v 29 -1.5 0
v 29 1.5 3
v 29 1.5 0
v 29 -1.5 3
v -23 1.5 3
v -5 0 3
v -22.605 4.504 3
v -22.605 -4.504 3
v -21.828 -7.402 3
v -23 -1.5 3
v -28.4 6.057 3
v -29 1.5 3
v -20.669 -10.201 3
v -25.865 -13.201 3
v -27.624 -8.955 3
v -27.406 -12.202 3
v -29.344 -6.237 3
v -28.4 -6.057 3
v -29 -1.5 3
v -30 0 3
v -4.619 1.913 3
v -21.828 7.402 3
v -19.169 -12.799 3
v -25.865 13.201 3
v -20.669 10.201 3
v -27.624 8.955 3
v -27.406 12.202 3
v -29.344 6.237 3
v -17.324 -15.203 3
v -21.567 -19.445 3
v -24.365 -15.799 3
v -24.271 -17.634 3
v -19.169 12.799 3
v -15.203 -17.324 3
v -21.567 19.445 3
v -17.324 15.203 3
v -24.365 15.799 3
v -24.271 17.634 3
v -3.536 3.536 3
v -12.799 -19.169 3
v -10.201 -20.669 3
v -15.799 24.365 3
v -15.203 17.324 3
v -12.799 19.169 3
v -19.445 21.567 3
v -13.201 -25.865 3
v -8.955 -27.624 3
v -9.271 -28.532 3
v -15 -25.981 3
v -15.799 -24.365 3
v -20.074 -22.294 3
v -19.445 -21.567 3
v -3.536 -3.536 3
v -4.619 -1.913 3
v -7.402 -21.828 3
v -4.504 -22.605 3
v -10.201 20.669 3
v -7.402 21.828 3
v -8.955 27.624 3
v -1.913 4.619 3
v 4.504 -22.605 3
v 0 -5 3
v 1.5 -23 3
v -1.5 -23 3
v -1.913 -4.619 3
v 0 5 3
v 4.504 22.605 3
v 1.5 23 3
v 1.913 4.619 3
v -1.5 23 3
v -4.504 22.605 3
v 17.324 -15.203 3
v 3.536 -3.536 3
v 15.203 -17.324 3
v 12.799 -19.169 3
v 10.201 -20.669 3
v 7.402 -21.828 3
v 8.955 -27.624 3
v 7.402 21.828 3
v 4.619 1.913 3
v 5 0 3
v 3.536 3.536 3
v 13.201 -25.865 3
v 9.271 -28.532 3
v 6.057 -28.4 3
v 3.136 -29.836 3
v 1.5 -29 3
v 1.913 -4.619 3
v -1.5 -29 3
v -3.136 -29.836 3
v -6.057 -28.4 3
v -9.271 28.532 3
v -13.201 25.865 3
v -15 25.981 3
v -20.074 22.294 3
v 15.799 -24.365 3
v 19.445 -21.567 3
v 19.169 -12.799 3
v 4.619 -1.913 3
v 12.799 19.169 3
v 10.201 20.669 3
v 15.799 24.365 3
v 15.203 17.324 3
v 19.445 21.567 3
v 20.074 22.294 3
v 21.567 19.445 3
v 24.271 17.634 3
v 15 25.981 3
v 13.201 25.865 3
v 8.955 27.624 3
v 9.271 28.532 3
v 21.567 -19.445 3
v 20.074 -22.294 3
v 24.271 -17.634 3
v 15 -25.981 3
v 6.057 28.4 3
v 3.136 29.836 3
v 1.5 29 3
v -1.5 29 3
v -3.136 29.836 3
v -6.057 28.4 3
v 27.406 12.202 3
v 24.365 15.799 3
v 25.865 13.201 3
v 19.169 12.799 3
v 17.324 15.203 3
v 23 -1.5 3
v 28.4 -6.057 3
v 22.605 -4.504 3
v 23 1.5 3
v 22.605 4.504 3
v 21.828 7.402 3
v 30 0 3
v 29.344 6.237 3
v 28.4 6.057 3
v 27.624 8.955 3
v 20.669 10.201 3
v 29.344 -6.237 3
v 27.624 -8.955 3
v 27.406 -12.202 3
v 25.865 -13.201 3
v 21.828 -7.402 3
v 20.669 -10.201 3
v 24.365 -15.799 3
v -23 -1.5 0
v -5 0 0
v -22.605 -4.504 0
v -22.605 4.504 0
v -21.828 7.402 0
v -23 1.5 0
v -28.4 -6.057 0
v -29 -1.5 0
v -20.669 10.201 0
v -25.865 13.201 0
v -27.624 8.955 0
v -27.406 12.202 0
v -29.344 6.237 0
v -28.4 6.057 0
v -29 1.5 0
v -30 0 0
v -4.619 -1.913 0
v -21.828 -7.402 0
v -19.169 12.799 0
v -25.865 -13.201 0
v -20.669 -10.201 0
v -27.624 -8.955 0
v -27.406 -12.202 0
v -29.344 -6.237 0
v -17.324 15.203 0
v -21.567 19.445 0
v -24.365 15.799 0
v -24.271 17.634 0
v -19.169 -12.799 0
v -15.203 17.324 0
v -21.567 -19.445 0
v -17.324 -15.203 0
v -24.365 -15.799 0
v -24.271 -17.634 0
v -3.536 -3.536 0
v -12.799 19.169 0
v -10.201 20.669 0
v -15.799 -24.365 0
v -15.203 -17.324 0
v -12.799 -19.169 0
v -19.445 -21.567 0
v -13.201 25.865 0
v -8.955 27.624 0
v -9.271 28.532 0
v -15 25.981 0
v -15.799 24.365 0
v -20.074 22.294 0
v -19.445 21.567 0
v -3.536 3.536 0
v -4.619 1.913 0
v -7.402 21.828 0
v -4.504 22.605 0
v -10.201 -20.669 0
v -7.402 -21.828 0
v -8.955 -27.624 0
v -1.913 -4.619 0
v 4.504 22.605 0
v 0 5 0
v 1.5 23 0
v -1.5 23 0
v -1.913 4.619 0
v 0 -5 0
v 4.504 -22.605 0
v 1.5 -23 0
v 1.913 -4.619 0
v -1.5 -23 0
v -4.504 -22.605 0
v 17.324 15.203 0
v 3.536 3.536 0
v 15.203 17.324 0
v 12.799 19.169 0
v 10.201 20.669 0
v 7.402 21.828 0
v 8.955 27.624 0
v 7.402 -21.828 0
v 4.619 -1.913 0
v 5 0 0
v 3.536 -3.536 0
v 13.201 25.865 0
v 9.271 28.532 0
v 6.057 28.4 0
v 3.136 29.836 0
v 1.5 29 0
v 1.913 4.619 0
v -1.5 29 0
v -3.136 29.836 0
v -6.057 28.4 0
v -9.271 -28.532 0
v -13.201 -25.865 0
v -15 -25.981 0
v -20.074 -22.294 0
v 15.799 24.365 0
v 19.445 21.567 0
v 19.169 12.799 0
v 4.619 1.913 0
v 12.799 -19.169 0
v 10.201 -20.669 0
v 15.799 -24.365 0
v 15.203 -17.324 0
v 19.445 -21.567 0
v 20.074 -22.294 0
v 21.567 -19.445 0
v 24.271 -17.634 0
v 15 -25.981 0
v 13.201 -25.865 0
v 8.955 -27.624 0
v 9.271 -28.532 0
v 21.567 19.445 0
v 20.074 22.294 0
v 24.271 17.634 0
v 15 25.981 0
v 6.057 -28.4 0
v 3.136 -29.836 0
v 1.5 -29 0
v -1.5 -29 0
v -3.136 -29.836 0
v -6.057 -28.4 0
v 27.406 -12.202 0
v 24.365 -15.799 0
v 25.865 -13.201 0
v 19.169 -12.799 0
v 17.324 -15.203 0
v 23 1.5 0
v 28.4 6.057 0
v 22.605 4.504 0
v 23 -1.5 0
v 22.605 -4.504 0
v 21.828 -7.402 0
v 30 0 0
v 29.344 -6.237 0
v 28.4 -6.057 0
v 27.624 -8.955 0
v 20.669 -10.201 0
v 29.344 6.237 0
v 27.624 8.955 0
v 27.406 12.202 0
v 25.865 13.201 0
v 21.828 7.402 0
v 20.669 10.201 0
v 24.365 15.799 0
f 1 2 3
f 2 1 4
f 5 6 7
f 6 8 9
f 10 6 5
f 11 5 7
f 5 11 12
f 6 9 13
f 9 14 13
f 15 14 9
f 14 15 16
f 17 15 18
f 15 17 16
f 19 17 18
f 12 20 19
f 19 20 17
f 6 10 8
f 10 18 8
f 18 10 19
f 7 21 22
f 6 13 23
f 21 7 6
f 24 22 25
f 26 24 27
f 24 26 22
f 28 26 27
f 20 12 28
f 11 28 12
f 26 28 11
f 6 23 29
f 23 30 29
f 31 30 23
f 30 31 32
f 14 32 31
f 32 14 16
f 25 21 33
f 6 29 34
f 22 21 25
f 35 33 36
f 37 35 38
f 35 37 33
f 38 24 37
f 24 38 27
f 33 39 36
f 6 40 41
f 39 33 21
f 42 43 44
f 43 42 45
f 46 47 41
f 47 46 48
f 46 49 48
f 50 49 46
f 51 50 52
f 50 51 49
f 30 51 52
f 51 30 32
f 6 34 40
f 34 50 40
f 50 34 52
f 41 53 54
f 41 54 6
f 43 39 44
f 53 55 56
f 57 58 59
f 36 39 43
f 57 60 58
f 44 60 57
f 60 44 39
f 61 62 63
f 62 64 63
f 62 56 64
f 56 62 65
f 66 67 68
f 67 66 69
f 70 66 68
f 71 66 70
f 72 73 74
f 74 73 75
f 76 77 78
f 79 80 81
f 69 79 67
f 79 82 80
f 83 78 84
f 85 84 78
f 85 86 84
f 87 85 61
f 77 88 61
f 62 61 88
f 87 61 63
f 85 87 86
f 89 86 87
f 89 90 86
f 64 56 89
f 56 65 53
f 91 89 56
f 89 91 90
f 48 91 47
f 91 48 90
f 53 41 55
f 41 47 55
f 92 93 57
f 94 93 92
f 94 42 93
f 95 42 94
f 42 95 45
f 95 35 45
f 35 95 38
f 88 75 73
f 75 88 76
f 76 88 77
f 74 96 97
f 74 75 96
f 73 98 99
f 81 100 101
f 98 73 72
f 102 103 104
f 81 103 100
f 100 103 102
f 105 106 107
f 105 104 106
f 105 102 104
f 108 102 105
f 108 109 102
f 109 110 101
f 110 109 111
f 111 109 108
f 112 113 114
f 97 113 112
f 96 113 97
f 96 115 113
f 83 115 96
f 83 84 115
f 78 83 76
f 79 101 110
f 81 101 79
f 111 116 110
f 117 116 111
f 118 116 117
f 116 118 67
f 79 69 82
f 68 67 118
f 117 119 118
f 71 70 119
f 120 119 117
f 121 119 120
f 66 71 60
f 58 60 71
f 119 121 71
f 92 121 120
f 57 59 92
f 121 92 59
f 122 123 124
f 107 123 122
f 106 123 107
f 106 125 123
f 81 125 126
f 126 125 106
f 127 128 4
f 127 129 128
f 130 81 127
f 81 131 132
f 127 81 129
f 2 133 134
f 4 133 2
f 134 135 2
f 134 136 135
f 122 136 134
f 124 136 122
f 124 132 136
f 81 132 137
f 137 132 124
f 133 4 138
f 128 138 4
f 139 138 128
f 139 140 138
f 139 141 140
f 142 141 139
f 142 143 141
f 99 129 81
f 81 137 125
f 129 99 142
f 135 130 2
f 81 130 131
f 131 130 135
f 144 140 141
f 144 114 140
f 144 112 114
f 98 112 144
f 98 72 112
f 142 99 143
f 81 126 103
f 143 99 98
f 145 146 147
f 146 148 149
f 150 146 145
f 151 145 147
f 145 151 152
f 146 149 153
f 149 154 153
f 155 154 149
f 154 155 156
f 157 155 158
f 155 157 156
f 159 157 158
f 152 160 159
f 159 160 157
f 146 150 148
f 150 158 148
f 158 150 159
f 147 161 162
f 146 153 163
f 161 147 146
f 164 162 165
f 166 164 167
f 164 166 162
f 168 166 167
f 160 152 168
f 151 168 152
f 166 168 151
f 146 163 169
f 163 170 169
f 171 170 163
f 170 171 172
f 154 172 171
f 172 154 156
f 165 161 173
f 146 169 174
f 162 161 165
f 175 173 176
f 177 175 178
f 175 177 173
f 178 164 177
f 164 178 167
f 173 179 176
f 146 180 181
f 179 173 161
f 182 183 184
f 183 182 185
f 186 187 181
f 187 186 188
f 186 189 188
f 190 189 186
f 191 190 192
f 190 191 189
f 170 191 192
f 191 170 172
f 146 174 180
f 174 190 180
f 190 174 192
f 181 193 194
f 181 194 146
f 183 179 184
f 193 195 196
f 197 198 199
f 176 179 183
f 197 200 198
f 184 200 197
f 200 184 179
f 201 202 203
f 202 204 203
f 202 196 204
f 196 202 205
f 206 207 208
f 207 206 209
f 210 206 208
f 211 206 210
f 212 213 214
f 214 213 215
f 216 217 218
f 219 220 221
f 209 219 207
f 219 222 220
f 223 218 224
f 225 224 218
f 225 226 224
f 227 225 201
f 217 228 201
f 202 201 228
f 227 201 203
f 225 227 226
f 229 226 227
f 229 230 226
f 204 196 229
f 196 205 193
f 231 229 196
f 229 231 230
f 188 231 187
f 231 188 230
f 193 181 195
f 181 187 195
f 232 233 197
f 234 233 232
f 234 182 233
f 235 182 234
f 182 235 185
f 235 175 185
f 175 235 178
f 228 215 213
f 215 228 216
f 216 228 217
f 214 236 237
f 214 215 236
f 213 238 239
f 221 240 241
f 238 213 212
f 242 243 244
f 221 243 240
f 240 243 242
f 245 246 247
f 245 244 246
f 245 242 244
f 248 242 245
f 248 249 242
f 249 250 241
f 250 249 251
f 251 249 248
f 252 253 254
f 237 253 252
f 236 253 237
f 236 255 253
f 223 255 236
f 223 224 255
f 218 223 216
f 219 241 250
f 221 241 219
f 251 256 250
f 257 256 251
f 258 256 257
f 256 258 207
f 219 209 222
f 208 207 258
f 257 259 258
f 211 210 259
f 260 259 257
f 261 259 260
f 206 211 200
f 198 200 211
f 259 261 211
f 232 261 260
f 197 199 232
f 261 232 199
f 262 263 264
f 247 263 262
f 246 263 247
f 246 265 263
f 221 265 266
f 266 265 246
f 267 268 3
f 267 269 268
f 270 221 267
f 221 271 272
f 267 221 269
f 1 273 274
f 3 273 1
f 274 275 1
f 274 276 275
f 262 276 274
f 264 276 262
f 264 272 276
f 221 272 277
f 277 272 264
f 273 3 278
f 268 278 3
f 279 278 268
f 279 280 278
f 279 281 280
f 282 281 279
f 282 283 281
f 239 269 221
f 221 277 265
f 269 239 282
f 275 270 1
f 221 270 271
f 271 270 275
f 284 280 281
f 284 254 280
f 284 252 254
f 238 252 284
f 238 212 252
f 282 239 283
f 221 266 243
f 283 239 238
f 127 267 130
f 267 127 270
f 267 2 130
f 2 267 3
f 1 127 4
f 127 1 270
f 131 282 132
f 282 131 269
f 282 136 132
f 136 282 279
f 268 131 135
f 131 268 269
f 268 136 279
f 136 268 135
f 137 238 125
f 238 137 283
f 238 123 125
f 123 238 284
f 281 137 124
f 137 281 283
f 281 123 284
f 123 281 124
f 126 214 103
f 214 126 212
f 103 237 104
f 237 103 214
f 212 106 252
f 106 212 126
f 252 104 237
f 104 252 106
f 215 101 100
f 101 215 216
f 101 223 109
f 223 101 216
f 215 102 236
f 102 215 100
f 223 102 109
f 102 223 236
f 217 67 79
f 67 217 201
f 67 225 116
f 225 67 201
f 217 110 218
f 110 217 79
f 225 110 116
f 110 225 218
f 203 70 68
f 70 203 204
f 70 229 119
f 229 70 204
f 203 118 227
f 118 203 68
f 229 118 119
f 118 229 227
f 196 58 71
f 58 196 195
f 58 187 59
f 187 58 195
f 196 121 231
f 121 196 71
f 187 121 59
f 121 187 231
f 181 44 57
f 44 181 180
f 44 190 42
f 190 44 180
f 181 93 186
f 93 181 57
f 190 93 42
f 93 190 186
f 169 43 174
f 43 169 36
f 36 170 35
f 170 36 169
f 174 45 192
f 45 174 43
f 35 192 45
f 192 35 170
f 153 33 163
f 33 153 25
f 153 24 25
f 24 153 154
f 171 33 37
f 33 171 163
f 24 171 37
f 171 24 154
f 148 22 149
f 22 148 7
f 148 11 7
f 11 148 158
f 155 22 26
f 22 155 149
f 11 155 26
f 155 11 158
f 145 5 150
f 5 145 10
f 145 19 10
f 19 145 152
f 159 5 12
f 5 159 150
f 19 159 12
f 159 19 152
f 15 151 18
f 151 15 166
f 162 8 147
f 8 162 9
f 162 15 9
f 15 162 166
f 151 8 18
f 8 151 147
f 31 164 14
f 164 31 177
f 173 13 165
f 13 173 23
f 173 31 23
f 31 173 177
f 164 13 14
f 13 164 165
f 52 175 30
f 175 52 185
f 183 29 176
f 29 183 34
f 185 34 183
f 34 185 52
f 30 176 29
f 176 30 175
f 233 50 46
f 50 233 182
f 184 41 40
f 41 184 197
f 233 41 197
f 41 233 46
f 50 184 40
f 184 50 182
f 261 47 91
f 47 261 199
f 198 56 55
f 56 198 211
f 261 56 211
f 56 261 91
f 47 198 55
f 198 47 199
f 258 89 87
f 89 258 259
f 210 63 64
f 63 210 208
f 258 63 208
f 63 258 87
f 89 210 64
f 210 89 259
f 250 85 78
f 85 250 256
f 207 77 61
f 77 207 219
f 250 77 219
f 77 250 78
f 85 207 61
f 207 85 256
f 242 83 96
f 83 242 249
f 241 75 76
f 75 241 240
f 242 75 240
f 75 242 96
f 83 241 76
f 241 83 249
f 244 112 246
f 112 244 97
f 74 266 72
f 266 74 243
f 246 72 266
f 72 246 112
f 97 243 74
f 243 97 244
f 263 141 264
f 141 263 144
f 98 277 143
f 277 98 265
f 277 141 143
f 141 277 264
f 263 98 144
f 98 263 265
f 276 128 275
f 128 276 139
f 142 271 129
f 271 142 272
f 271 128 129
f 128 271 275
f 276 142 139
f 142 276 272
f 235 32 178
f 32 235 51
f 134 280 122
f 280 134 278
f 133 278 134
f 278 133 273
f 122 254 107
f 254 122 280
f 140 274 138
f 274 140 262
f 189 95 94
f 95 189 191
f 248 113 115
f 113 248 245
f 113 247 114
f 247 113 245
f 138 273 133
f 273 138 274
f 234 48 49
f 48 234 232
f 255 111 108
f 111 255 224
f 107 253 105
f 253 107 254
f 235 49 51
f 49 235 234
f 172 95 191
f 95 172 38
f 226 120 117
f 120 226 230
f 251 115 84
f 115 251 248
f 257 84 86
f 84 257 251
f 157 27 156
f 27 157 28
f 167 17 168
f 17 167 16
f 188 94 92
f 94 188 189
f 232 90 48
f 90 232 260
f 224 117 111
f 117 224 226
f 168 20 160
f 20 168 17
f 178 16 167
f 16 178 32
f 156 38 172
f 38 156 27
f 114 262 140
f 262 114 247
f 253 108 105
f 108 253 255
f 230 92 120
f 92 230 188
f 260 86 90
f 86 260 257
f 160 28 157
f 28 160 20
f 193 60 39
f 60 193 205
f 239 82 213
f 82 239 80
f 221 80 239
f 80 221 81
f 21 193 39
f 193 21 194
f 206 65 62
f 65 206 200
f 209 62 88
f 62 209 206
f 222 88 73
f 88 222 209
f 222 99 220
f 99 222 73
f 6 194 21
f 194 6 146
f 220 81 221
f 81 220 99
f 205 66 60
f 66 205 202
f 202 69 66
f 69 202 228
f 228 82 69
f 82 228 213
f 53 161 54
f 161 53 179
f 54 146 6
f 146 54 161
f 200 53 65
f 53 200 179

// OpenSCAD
/* [Main disc] */

//How big is the main disc.  All values in mm
disc_radius = 30;
//How thick is the main disc.
disc_thickness = 3;
//How big is the center hole?
hole_radius = 5;

/* [Slots] */
//How big is your slot?
slot_height = 6;
//How wide is your slot?
slot_width = 3;
//How far from the edge of the disk do you want the slot?
slot_offset = 1;

//How much rotation before I draw the next slot.  You'll get the best results if this is a clean divisor of 360.
rotate_by = 15; //[1:360]

/* [Hidden] */
current_rotation = 0;

rotate_steps = 360 / rotate_by;

difference(){
    cylinder(disc_thickness,disc_radius,disc_radius);
    cylinder(disc_thickness,hole_radius,hole_radius);
  
    for(i  = [0:1:rotate_steps])
    {
        rotate([0,0,rotate_by*i]){
            slot();
        }
    }
}
    
module slot(){
    translate([disc_radius - slot_height - slot_offset,-(slot_width/2),0]) 
        cube([slot_height,slot_width,disc_thickness]);
}
